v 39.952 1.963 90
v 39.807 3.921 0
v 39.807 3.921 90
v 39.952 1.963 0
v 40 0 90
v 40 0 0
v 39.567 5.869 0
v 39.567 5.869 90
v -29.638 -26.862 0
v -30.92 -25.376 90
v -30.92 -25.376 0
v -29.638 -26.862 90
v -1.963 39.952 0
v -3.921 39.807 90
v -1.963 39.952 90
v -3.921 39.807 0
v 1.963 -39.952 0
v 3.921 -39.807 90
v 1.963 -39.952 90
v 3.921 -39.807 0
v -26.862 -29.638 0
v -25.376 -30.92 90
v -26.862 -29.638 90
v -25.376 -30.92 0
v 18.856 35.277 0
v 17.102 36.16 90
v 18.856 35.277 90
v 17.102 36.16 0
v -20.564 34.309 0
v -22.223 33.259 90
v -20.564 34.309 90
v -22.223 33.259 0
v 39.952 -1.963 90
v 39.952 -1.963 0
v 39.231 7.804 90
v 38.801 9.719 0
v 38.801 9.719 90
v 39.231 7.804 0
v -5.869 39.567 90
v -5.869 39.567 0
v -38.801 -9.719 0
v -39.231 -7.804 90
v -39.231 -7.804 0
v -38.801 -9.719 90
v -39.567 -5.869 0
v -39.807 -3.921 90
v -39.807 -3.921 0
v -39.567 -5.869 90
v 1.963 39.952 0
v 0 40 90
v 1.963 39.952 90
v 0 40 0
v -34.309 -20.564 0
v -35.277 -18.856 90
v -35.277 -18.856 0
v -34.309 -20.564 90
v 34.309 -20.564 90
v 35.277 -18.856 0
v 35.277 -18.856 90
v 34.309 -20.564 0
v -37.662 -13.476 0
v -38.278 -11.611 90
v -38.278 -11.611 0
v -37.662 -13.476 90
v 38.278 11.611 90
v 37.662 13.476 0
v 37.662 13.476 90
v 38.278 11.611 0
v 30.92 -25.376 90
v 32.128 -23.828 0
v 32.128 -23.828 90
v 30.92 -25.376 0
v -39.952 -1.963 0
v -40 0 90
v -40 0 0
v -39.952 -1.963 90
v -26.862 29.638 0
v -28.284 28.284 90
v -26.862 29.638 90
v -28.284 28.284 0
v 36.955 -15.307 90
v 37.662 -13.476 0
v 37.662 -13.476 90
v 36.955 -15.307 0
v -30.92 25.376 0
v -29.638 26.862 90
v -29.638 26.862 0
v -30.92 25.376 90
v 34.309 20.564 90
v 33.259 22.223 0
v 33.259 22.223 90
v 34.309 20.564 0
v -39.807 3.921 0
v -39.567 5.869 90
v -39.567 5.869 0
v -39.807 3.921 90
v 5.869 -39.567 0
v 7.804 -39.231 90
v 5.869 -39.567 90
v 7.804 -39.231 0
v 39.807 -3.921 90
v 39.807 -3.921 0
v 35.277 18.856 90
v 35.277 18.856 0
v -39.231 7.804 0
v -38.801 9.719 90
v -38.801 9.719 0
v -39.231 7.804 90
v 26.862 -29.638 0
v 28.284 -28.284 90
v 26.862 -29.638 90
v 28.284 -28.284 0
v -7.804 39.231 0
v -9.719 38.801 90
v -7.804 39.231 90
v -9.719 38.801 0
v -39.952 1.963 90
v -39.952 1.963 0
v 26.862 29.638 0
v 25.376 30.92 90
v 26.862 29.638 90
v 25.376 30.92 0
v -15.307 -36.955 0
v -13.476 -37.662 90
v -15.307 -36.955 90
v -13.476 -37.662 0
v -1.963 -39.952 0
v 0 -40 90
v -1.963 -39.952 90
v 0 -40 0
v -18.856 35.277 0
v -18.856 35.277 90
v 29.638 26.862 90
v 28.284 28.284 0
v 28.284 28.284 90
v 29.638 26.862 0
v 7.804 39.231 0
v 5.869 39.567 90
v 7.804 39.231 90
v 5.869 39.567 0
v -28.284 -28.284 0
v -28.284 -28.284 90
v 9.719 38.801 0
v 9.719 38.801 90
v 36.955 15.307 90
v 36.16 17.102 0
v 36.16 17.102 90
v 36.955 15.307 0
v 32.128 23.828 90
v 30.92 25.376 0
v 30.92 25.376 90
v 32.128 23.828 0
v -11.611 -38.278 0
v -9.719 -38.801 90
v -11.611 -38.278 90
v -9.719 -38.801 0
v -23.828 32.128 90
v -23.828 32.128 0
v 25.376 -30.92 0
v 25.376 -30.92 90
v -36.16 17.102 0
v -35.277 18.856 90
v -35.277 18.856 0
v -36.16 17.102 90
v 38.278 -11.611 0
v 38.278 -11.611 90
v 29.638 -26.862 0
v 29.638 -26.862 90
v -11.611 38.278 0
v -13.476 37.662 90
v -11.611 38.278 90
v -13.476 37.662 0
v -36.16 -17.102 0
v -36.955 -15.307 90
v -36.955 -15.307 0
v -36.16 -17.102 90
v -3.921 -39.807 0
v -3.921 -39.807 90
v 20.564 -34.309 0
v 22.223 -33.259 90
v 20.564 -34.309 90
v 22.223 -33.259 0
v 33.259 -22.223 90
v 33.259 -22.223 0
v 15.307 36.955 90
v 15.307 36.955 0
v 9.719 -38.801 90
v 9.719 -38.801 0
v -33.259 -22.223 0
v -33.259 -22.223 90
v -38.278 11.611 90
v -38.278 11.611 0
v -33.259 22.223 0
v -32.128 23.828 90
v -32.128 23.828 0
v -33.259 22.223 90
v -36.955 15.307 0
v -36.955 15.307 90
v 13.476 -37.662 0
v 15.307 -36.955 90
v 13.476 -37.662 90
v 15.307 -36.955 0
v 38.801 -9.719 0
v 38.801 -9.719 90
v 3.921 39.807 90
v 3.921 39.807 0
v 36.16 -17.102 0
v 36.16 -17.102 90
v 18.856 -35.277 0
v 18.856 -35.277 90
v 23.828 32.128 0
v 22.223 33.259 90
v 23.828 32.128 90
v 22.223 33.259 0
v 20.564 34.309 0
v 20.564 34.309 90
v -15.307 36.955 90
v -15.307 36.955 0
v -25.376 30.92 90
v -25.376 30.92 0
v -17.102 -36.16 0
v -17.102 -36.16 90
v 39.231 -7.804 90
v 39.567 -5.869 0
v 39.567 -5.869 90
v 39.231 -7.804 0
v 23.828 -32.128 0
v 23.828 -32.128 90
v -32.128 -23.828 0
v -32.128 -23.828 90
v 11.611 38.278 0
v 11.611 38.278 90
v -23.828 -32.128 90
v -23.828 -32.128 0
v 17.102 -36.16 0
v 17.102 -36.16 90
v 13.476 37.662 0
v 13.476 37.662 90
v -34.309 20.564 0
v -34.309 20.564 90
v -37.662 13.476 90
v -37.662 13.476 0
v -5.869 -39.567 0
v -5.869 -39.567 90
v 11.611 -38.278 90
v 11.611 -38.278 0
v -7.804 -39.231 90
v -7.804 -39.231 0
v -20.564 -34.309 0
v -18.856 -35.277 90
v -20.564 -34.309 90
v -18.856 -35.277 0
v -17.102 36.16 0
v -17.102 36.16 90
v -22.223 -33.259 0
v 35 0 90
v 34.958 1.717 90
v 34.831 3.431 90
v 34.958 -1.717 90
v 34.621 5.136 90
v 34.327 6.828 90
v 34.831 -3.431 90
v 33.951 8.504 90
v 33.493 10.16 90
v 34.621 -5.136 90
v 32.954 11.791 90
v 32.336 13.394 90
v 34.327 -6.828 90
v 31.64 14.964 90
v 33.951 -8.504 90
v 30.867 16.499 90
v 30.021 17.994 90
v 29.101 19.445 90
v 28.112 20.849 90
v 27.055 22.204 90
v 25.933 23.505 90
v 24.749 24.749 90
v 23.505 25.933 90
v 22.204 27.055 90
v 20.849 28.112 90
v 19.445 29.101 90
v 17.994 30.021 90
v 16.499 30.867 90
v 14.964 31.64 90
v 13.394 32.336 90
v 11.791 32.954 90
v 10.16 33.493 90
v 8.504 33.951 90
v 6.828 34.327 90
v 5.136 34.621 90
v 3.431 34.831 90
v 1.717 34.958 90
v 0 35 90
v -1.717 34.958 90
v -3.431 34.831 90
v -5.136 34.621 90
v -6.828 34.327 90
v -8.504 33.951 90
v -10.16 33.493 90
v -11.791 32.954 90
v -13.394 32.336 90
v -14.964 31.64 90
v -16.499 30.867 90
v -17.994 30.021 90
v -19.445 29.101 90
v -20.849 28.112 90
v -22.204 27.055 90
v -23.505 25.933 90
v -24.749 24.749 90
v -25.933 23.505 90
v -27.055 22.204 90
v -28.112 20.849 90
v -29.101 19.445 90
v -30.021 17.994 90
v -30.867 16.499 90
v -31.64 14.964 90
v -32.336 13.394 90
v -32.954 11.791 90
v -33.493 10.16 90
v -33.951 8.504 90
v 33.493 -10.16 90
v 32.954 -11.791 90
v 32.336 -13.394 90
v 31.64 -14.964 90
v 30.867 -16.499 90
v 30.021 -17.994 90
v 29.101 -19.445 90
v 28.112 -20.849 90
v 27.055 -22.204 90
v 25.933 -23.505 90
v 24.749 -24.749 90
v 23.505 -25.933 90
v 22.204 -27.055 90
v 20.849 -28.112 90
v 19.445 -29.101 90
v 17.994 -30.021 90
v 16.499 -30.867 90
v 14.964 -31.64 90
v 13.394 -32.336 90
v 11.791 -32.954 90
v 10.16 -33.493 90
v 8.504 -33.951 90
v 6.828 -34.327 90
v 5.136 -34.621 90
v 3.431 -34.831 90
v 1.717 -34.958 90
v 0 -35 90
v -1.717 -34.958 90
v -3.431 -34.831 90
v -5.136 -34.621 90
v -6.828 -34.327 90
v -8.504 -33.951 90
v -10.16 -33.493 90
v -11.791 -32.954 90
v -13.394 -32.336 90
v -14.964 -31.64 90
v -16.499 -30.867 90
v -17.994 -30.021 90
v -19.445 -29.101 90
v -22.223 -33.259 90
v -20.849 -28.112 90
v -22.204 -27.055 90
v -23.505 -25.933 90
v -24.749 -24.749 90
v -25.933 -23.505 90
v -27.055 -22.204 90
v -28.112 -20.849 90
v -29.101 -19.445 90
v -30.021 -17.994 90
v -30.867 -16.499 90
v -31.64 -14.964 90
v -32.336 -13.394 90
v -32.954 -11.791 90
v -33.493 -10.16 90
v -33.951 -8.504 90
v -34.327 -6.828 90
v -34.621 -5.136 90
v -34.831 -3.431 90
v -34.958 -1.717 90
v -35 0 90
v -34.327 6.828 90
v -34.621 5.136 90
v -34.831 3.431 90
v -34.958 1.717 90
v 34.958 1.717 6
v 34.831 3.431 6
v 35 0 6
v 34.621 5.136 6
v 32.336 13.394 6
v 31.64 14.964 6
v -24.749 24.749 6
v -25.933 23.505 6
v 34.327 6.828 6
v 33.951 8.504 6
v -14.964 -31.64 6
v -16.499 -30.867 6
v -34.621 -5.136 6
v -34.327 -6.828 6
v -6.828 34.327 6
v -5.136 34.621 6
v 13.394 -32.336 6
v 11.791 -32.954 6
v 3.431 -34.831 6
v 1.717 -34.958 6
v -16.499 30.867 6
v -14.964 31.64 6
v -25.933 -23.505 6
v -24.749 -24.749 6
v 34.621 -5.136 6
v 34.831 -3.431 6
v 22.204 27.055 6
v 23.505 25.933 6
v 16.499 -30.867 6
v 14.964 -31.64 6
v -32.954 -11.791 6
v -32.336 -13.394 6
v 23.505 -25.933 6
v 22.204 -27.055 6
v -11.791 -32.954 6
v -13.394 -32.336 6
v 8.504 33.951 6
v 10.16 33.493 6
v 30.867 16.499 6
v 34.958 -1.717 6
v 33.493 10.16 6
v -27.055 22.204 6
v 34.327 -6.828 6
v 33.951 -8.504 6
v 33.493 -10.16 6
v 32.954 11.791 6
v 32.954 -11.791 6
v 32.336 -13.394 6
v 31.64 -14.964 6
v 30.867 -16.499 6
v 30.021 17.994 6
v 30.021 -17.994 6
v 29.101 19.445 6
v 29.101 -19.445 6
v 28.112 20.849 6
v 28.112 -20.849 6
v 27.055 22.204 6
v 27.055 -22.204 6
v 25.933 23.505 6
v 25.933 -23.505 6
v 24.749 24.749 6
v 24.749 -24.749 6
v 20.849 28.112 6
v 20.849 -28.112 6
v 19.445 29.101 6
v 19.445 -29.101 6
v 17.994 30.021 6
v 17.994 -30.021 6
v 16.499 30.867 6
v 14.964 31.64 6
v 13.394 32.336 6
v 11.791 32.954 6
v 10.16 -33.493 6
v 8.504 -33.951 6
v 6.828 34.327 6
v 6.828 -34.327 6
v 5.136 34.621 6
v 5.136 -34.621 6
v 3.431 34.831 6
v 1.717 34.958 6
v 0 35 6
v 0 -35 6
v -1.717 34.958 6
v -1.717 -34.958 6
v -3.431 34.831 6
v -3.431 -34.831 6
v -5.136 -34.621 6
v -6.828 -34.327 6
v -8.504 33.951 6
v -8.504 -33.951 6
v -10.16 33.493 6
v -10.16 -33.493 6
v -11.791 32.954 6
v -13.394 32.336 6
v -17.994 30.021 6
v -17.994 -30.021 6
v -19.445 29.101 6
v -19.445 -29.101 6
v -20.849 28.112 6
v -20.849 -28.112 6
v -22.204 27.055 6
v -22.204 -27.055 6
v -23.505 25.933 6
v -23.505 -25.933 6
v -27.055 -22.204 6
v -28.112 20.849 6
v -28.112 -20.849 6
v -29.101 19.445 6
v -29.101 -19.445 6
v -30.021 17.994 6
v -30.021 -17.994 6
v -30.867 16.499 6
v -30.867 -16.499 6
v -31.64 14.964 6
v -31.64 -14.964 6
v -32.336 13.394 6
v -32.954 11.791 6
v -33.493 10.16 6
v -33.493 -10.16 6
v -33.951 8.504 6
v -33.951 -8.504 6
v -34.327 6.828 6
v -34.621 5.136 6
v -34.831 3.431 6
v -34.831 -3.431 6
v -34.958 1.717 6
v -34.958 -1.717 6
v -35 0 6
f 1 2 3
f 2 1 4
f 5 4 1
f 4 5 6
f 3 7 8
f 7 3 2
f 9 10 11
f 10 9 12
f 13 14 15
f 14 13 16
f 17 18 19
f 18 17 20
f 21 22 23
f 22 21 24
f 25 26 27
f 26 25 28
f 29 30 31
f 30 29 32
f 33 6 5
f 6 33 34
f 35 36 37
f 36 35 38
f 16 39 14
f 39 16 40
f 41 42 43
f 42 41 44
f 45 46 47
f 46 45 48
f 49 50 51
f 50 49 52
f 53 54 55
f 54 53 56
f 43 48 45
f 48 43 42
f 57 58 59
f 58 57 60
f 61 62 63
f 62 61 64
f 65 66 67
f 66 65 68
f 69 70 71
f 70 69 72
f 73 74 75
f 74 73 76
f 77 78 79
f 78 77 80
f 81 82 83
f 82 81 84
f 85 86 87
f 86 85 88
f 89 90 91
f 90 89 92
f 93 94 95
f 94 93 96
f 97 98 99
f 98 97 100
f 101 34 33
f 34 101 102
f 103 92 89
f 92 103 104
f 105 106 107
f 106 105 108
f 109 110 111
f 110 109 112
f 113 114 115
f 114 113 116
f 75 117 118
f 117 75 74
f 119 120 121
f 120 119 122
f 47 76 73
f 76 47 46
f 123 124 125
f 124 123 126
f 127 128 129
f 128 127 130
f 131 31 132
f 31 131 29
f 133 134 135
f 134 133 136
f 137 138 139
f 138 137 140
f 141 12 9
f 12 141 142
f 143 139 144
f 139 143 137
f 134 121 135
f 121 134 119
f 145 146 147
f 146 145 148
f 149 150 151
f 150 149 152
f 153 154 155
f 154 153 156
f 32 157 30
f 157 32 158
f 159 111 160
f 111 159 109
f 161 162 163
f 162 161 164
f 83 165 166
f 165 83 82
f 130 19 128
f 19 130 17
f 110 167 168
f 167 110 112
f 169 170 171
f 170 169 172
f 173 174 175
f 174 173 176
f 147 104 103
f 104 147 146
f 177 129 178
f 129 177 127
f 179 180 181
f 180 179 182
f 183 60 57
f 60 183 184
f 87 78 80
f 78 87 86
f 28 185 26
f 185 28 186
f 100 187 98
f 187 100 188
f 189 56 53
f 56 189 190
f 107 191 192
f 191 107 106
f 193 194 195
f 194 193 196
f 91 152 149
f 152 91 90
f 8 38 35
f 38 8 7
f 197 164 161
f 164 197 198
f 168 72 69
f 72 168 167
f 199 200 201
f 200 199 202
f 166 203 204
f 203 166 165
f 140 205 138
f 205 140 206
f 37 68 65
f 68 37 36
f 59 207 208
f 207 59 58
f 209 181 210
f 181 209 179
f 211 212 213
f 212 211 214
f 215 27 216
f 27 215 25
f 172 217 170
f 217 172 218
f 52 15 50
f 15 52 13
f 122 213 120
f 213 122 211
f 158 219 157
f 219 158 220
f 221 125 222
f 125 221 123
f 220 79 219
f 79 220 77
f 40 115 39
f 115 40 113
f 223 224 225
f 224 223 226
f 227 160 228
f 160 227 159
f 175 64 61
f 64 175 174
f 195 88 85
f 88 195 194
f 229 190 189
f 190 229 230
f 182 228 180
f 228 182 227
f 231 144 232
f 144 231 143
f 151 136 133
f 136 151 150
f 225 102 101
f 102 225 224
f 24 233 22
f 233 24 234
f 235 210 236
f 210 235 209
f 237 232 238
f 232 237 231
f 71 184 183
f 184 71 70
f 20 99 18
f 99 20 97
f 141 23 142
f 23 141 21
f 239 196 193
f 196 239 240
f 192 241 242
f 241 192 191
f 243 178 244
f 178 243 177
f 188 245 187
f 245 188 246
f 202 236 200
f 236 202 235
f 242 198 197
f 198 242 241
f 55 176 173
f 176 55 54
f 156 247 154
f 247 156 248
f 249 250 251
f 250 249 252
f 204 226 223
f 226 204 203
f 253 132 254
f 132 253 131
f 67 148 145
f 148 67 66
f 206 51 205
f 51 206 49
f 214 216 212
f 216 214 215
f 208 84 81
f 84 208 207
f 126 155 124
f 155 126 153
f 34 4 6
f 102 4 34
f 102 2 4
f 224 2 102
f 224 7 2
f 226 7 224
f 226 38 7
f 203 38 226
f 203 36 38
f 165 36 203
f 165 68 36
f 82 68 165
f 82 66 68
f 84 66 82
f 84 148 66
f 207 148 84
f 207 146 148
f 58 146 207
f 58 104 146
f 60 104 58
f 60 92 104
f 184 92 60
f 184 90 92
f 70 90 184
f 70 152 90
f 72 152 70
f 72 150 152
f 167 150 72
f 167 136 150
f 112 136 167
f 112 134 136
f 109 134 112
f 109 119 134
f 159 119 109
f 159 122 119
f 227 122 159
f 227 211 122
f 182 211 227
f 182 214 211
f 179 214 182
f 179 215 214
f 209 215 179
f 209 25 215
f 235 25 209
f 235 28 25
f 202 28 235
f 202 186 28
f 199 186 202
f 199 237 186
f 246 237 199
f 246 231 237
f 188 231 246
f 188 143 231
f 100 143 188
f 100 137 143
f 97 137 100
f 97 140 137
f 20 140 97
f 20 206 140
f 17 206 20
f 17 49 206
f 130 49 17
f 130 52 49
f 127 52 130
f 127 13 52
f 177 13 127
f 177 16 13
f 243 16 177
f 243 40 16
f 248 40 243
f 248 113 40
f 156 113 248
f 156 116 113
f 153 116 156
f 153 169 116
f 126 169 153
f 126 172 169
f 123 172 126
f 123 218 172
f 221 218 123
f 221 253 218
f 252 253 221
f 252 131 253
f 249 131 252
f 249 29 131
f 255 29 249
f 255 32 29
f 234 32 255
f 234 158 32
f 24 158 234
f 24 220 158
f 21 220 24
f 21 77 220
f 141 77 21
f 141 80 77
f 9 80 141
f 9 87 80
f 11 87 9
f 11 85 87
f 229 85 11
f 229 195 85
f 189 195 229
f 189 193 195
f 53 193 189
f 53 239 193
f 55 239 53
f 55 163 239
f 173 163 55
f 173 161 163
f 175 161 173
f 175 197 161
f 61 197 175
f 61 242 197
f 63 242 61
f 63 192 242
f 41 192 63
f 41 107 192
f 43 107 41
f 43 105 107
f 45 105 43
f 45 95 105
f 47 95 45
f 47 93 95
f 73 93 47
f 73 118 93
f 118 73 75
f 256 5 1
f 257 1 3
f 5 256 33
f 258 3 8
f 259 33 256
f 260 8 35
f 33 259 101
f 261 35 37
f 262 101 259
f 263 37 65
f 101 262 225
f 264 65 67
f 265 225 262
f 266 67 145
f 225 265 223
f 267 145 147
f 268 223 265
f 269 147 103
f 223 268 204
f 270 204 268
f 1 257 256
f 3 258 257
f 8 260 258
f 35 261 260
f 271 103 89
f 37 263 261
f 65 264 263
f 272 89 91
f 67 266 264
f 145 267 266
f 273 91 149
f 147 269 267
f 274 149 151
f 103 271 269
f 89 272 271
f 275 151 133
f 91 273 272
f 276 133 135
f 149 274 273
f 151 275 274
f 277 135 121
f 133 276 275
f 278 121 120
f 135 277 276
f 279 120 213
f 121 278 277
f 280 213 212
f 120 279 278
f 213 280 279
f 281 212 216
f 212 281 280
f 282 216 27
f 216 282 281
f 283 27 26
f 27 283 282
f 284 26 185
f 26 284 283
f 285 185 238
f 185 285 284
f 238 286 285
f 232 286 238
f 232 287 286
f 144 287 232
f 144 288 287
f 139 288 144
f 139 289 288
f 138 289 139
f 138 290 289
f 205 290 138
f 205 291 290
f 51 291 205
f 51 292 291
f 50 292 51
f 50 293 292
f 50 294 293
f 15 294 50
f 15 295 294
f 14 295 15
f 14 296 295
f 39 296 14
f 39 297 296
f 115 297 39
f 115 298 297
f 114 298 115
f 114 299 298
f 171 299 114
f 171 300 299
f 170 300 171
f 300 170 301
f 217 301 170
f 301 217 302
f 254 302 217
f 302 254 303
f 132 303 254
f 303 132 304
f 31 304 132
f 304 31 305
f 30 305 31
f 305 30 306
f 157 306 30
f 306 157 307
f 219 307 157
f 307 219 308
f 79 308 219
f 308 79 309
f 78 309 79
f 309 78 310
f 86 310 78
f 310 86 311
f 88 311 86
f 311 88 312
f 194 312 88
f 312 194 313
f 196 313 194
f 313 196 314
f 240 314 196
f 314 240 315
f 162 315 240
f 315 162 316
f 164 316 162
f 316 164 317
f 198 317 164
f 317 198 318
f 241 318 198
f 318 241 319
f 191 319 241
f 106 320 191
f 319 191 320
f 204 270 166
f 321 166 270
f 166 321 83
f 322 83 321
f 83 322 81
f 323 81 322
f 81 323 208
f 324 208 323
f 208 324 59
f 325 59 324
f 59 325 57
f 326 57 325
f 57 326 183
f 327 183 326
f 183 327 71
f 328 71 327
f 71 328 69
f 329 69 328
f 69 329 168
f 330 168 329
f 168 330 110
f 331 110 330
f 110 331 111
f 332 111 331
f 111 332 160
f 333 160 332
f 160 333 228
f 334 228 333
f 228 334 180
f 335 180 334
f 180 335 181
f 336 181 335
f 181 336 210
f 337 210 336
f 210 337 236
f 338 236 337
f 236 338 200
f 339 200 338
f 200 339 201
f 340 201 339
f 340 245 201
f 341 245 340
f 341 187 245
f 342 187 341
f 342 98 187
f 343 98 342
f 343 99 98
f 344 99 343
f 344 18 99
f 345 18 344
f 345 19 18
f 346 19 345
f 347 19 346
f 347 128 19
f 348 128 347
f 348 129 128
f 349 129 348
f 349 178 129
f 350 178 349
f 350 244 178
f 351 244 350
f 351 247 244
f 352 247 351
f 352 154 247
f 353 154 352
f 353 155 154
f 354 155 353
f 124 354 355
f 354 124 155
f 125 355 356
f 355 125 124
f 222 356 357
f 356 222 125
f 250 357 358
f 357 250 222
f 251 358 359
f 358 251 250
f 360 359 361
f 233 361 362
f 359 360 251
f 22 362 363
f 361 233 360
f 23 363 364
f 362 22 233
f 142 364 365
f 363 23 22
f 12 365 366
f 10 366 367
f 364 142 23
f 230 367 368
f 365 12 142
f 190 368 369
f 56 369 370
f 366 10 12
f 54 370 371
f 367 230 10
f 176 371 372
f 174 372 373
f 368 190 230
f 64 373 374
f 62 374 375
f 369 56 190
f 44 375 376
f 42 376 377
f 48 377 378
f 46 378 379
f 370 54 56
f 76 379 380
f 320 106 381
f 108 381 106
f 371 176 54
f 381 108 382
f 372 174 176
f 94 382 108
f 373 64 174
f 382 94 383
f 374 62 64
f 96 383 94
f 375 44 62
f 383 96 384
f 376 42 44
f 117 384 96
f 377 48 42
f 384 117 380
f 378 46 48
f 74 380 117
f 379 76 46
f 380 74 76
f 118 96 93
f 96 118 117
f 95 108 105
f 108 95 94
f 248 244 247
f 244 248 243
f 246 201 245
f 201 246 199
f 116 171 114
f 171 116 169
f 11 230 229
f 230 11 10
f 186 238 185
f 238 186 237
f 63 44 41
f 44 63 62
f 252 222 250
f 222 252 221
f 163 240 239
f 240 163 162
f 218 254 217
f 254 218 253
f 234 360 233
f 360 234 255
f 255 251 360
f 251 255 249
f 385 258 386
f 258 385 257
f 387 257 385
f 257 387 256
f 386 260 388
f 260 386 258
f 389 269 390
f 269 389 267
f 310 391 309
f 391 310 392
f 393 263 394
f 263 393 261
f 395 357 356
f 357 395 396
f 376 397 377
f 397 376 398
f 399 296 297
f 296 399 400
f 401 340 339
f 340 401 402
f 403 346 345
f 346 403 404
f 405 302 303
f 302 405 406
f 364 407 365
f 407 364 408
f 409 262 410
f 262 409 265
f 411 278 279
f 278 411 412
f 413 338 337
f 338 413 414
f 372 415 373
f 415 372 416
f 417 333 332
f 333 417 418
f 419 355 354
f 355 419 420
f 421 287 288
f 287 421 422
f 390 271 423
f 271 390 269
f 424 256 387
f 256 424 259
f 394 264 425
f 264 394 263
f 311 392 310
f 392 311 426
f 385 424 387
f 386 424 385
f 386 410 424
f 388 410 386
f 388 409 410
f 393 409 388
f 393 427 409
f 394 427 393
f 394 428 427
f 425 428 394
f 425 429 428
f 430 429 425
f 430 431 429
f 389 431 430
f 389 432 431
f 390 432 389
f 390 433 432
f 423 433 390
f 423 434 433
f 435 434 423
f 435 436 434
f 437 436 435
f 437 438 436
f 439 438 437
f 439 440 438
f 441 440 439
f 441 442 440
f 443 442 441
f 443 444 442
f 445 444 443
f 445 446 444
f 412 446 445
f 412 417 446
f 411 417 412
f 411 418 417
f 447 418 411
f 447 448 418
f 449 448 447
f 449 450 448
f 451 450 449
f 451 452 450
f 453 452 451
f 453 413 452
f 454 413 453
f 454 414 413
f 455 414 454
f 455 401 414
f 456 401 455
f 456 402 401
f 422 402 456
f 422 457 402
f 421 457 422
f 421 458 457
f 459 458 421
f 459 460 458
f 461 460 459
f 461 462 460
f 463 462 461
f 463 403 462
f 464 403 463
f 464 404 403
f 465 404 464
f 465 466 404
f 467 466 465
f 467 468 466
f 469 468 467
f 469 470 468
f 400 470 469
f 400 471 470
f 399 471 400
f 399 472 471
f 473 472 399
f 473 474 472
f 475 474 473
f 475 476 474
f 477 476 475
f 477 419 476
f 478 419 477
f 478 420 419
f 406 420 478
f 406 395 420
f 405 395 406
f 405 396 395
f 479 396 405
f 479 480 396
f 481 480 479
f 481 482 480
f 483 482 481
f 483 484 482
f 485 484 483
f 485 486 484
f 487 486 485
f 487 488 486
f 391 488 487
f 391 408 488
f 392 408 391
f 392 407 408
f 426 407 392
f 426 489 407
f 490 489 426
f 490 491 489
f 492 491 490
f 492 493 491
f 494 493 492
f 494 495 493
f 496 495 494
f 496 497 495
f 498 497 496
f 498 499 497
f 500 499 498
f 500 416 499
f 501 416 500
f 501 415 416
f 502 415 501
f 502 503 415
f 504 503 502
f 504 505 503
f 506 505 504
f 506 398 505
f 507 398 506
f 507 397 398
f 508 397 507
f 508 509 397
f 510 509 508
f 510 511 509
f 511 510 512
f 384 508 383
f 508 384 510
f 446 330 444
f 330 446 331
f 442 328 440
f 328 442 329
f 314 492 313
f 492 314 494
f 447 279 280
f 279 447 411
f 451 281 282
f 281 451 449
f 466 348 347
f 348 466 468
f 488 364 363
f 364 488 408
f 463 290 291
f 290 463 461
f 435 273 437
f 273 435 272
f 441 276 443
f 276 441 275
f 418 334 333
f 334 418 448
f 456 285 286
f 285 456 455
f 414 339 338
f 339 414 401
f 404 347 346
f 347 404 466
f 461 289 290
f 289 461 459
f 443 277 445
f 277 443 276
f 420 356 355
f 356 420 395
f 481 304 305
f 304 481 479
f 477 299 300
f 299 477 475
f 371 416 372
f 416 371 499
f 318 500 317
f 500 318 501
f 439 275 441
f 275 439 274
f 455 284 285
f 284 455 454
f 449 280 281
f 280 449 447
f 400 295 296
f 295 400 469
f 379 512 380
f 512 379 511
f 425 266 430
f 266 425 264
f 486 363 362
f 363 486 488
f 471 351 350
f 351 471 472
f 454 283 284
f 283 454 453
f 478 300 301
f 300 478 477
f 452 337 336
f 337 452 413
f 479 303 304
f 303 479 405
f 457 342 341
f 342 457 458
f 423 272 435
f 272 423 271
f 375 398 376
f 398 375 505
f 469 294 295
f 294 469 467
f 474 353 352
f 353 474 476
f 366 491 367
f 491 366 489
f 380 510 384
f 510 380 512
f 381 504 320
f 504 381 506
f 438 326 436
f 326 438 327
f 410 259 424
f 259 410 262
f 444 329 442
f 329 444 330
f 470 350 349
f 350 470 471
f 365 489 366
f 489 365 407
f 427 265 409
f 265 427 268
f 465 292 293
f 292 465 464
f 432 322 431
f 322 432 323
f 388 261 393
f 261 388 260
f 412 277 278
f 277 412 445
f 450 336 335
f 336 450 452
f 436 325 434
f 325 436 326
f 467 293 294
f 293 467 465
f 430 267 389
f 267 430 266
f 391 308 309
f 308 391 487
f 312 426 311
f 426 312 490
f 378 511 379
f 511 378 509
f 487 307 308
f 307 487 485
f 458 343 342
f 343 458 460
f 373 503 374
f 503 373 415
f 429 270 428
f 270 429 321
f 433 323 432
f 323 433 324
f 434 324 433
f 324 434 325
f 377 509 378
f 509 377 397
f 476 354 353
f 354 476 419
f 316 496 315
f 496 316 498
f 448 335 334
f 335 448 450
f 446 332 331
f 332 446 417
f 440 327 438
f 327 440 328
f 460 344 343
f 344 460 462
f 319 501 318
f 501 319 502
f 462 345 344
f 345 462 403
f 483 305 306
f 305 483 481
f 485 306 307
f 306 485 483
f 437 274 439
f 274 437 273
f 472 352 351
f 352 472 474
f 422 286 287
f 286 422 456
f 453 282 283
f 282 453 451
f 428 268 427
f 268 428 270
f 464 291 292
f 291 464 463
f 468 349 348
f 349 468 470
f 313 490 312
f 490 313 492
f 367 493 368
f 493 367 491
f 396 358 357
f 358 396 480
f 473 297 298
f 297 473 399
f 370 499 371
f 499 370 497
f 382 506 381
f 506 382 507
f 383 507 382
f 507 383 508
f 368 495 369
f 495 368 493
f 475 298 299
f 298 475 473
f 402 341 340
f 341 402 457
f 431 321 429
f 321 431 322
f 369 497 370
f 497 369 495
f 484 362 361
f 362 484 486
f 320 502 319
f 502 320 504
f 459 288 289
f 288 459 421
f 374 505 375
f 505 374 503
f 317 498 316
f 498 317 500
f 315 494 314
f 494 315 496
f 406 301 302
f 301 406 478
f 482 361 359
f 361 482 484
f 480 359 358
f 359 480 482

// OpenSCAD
$fn = 128;

module d_shape(x0, rect_width, radius) {
    union() {
        translate([x0, -radius])
            square([rect_width, 2 * radius]);

        translate([x0 + rect_width, 0])
            circle(r = radius);
    }
}

module handle_profile() {
    difference() {
        // 外形: 幅40mm、高さ40mmのD字形
        d_shape(35, 20, 20);

        // 内側空間: 幅25mm、高さ30mmのD字形
        d_shape(40, 10, 15);
    }
}

union() {
    // 本体: 外径80mm、内径70mm、高さ90mm、底厚6mm
    difference() {
        cylinder(r = 40, h = 90);

        translate([0, 0, 6])
            cylinder(r = 35, h = 90);
    }

    // 取手: +X方向のみ、中央高さに配置
    translate([0, 6, 45])
        rotate([90, 0, 0])
            linear_extrude(height = 12)
                handle_profile();
}
